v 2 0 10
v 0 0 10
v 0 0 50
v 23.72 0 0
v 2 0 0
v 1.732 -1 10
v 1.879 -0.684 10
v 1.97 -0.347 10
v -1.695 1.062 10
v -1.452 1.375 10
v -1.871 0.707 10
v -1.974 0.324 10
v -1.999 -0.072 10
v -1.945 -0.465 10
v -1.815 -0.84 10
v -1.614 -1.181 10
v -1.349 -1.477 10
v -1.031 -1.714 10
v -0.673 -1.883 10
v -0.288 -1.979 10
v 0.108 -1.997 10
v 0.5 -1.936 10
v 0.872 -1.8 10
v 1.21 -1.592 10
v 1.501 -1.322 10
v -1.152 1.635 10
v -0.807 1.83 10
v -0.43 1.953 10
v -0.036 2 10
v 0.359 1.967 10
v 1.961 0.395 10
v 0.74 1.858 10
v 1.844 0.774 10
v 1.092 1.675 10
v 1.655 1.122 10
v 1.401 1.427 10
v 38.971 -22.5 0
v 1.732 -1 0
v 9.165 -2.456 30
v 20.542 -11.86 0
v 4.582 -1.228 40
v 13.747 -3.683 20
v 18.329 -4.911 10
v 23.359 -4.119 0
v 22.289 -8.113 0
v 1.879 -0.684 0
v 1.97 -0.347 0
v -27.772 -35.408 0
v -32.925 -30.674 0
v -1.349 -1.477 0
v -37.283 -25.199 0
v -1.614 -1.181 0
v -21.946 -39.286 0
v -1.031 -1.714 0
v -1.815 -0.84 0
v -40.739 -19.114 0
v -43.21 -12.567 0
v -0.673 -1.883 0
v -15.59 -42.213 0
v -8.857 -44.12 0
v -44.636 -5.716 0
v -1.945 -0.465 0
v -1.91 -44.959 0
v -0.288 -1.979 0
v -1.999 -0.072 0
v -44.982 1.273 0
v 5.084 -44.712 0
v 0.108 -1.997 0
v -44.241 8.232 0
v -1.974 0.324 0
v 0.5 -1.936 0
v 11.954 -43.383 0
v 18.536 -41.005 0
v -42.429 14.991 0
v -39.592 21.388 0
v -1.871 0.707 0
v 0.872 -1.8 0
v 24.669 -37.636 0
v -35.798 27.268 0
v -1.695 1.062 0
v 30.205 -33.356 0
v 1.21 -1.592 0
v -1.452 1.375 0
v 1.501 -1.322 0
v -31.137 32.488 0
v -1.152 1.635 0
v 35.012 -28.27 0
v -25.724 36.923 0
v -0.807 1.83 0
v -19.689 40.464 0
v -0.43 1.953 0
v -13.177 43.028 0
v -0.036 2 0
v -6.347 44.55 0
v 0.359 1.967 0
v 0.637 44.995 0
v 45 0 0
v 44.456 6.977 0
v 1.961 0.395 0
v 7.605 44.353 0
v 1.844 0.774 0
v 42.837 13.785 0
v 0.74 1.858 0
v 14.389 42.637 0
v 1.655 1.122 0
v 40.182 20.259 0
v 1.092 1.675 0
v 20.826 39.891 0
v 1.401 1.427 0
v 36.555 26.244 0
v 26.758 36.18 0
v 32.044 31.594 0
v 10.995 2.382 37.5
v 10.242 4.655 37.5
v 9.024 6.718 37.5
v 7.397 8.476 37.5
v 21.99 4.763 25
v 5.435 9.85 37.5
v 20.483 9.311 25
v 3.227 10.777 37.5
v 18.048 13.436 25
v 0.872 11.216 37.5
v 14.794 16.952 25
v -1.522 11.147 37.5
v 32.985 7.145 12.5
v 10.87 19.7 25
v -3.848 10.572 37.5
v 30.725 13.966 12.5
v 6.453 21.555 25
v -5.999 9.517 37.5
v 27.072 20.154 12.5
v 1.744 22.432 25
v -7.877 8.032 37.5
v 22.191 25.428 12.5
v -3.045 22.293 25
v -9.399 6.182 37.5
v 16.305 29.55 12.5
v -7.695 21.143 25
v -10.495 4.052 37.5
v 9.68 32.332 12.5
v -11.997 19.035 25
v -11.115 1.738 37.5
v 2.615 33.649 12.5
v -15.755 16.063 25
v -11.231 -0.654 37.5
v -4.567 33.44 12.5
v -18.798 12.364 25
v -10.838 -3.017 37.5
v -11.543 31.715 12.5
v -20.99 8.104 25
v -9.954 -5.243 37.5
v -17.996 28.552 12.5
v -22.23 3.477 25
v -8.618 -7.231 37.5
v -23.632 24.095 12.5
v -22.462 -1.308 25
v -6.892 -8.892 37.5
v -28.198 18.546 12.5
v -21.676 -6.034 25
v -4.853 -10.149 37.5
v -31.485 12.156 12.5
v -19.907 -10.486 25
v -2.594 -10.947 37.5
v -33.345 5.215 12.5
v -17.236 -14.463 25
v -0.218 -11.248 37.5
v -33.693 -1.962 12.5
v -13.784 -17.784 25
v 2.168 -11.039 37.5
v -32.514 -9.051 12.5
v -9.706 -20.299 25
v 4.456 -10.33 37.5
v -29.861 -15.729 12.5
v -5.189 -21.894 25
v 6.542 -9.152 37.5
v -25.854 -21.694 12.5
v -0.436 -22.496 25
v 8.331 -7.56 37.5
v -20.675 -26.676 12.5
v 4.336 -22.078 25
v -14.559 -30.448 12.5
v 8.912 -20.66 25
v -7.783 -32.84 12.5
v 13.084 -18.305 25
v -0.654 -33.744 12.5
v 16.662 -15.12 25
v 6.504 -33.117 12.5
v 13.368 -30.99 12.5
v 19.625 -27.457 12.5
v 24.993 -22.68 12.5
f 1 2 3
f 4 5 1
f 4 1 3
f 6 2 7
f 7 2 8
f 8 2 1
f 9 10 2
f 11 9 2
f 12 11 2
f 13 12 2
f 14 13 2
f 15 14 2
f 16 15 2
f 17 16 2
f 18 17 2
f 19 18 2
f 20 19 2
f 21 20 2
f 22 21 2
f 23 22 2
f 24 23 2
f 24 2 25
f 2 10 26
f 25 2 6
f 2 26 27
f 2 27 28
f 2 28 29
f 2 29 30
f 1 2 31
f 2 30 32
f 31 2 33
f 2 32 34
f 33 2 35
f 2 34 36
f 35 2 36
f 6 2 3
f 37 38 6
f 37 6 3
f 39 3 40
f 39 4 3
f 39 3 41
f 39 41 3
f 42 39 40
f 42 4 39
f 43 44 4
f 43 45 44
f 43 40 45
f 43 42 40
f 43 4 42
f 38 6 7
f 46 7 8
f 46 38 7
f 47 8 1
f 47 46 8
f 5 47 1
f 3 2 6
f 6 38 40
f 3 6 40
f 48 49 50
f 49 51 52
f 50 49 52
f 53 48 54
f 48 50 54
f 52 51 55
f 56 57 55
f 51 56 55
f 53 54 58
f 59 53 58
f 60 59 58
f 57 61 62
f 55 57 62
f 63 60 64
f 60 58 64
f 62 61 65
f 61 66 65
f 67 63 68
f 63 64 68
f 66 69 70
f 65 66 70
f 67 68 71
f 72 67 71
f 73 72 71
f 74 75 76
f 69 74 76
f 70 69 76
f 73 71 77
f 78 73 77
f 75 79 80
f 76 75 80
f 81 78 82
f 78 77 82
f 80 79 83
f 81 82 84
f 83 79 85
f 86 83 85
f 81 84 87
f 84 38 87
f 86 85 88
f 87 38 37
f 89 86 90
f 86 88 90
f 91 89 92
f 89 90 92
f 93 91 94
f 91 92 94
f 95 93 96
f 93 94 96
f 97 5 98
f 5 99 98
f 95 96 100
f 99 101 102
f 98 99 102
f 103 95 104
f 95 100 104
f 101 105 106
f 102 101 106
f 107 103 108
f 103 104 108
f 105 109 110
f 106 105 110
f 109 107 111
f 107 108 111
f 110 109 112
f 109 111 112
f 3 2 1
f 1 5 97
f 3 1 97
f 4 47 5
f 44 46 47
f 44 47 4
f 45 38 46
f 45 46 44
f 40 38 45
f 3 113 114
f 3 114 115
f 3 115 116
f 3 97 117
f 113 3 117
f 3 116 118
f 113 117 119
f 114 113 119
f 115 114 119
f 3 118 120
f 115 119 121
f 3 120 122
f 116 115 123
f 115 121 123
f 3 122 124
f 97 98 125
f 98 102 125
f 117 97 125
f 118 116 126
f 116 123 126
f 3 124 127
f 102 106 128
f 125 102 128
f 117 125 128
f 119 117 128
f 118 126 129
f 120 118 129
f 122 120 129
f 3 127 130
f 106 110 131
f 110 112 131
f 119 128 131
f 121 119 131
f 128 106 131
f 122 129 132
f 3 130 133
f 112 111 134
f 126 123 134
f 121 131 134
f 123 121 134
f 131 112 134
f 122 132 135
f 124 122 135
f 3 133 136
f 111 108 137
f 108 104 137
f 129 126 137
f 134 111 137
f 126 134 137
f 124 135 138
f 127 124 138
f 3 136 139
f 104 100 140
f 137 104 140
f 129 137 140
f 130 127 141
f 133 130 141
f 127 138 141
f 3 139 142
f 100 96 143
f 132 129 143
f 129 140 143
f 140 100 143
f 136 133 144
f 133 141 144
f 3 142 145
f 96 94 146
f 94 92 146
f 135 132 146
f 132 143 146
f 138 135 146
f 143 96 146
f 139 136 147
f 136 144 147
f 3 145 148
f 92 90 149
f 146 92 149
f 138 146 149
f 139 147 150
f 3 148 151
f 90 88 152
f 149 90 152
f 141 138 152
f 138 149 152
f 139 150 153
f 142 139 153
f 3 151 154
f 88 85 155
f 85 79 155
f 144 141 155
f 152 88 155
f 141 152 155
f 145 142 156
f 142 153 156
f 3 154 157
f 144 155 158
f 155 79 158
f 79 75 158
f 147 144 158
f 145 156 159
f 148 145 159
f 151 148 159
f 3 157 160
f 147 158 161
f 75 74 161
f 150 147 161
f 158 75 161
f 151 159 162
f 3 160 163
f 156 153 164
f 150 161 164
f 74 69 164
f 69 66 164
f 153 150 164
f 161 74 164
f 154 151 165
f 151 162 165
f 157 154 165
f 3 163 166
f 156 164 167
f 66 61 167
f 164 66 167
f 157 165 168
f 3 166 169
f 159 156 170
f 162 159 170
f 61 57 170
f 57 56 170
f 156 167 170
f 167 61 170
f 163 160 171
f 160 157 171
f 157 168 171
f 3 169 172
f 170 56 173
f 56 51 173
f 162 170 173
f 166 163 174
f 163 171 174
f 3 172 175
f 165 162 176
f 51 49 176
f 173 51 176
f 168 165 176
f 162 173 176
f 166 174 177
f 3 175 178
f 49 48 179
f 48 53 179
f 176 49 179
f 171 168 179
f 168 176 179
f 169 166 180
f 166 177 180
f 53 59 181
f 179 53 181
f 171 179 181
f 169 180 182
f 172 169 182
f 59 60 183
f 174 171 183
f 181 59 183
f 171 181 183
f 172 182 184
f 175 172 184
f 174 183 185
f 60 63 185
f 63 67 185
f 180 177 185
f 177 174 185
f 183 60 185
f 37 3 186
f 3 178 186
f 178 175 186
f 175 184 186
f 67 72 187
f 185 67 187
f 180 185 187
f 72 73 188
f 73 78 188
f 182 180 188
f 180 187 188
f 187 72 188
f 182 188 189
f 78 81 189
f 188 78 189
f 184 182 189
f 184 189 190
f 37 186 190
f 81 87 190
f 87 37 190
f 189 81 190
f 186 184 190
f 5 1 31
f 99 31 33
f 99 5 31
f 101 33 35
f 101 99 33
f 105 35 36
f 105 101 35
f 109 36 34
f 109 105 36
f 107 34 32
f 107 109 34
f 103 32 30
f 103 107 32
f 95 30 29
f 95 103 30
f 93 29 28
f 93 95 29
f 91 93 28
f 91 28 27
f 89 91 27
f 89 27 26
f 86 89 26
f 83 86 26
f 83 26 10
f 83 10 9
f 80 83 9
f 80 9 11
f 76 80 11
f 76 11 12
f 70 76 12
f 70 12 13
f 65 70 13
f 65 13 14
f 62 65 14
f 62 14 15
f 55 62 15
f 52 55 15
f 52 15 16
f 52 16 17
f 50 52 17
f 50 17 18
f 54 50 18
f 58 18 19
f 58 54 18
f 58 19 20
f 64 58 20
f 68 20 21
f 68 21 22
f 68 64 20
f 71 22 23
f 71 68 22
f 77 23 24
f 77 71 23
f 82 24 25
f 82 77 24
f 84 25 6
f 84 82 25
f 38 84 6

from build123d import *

# Parameters (mm, degrees)
REVOLVE3_ANGLE     = 330
REVOLVE7_ANGLE     = 30
SKETCH1_R          = 2
CUT_EXTRUDE2_DEPTH = 10


with BuildPart() as part:
    # Sketch4 → Revolve3 (revolve)
    with BuildSketch(Plane(origin=(0, 0, 0), x_dir=(1, 0, 0), z_dir=(0, 1, 0))):
        Polygon((0, -50), (45, 0), (0, 0), align=None)
    revolve(axis=Axis((0, 0, 0), (0, 0, 1)), revolution_arc=REVOLVE3_ANGLE)


with BuildPart() as body_2:
    # Sketch7 → Revolve7 (revolve)
    with BuildSketch(Plane(origin=(0, 0, 0), x_dir=(1, 0, 0), z_dir=(0, 1, 0))):
        Polygon((0, -50), (23.719550692, 0), (17.405636357, 0), (0, 0), align=None)
    revolve(axis=Axis((0, 0, 0), (0, 0, -1)), revolution_arc=REVOLVE7_ANGLE)


with BuildPart() as cut_extrude2_tool:
    # Sketch1 → Cut-Extrude2 (new body)
    with BuildSketch(Plane.XY):
        Circle(SKETCH1_R)
    extrude(amount=CUT_EXTRUDE2_DEPTH)


with BuildPart() as part_1:
    add(part.part)

    # Cut-Extrude2: cut by cut_extrude2_tool
    add(cut_extrude2_tool.part, mode=Mode.SUBTRACT)


with BuildPart() as body_2_1:
    add(body_2.part)

    # Cut-Extrude2: cut by cut_extrude2_tool
    add(cut_extrude2_tool.part, mode=Mode.SUBTRACT)


solid = Compound([part_1.part, body_2_1.part])
